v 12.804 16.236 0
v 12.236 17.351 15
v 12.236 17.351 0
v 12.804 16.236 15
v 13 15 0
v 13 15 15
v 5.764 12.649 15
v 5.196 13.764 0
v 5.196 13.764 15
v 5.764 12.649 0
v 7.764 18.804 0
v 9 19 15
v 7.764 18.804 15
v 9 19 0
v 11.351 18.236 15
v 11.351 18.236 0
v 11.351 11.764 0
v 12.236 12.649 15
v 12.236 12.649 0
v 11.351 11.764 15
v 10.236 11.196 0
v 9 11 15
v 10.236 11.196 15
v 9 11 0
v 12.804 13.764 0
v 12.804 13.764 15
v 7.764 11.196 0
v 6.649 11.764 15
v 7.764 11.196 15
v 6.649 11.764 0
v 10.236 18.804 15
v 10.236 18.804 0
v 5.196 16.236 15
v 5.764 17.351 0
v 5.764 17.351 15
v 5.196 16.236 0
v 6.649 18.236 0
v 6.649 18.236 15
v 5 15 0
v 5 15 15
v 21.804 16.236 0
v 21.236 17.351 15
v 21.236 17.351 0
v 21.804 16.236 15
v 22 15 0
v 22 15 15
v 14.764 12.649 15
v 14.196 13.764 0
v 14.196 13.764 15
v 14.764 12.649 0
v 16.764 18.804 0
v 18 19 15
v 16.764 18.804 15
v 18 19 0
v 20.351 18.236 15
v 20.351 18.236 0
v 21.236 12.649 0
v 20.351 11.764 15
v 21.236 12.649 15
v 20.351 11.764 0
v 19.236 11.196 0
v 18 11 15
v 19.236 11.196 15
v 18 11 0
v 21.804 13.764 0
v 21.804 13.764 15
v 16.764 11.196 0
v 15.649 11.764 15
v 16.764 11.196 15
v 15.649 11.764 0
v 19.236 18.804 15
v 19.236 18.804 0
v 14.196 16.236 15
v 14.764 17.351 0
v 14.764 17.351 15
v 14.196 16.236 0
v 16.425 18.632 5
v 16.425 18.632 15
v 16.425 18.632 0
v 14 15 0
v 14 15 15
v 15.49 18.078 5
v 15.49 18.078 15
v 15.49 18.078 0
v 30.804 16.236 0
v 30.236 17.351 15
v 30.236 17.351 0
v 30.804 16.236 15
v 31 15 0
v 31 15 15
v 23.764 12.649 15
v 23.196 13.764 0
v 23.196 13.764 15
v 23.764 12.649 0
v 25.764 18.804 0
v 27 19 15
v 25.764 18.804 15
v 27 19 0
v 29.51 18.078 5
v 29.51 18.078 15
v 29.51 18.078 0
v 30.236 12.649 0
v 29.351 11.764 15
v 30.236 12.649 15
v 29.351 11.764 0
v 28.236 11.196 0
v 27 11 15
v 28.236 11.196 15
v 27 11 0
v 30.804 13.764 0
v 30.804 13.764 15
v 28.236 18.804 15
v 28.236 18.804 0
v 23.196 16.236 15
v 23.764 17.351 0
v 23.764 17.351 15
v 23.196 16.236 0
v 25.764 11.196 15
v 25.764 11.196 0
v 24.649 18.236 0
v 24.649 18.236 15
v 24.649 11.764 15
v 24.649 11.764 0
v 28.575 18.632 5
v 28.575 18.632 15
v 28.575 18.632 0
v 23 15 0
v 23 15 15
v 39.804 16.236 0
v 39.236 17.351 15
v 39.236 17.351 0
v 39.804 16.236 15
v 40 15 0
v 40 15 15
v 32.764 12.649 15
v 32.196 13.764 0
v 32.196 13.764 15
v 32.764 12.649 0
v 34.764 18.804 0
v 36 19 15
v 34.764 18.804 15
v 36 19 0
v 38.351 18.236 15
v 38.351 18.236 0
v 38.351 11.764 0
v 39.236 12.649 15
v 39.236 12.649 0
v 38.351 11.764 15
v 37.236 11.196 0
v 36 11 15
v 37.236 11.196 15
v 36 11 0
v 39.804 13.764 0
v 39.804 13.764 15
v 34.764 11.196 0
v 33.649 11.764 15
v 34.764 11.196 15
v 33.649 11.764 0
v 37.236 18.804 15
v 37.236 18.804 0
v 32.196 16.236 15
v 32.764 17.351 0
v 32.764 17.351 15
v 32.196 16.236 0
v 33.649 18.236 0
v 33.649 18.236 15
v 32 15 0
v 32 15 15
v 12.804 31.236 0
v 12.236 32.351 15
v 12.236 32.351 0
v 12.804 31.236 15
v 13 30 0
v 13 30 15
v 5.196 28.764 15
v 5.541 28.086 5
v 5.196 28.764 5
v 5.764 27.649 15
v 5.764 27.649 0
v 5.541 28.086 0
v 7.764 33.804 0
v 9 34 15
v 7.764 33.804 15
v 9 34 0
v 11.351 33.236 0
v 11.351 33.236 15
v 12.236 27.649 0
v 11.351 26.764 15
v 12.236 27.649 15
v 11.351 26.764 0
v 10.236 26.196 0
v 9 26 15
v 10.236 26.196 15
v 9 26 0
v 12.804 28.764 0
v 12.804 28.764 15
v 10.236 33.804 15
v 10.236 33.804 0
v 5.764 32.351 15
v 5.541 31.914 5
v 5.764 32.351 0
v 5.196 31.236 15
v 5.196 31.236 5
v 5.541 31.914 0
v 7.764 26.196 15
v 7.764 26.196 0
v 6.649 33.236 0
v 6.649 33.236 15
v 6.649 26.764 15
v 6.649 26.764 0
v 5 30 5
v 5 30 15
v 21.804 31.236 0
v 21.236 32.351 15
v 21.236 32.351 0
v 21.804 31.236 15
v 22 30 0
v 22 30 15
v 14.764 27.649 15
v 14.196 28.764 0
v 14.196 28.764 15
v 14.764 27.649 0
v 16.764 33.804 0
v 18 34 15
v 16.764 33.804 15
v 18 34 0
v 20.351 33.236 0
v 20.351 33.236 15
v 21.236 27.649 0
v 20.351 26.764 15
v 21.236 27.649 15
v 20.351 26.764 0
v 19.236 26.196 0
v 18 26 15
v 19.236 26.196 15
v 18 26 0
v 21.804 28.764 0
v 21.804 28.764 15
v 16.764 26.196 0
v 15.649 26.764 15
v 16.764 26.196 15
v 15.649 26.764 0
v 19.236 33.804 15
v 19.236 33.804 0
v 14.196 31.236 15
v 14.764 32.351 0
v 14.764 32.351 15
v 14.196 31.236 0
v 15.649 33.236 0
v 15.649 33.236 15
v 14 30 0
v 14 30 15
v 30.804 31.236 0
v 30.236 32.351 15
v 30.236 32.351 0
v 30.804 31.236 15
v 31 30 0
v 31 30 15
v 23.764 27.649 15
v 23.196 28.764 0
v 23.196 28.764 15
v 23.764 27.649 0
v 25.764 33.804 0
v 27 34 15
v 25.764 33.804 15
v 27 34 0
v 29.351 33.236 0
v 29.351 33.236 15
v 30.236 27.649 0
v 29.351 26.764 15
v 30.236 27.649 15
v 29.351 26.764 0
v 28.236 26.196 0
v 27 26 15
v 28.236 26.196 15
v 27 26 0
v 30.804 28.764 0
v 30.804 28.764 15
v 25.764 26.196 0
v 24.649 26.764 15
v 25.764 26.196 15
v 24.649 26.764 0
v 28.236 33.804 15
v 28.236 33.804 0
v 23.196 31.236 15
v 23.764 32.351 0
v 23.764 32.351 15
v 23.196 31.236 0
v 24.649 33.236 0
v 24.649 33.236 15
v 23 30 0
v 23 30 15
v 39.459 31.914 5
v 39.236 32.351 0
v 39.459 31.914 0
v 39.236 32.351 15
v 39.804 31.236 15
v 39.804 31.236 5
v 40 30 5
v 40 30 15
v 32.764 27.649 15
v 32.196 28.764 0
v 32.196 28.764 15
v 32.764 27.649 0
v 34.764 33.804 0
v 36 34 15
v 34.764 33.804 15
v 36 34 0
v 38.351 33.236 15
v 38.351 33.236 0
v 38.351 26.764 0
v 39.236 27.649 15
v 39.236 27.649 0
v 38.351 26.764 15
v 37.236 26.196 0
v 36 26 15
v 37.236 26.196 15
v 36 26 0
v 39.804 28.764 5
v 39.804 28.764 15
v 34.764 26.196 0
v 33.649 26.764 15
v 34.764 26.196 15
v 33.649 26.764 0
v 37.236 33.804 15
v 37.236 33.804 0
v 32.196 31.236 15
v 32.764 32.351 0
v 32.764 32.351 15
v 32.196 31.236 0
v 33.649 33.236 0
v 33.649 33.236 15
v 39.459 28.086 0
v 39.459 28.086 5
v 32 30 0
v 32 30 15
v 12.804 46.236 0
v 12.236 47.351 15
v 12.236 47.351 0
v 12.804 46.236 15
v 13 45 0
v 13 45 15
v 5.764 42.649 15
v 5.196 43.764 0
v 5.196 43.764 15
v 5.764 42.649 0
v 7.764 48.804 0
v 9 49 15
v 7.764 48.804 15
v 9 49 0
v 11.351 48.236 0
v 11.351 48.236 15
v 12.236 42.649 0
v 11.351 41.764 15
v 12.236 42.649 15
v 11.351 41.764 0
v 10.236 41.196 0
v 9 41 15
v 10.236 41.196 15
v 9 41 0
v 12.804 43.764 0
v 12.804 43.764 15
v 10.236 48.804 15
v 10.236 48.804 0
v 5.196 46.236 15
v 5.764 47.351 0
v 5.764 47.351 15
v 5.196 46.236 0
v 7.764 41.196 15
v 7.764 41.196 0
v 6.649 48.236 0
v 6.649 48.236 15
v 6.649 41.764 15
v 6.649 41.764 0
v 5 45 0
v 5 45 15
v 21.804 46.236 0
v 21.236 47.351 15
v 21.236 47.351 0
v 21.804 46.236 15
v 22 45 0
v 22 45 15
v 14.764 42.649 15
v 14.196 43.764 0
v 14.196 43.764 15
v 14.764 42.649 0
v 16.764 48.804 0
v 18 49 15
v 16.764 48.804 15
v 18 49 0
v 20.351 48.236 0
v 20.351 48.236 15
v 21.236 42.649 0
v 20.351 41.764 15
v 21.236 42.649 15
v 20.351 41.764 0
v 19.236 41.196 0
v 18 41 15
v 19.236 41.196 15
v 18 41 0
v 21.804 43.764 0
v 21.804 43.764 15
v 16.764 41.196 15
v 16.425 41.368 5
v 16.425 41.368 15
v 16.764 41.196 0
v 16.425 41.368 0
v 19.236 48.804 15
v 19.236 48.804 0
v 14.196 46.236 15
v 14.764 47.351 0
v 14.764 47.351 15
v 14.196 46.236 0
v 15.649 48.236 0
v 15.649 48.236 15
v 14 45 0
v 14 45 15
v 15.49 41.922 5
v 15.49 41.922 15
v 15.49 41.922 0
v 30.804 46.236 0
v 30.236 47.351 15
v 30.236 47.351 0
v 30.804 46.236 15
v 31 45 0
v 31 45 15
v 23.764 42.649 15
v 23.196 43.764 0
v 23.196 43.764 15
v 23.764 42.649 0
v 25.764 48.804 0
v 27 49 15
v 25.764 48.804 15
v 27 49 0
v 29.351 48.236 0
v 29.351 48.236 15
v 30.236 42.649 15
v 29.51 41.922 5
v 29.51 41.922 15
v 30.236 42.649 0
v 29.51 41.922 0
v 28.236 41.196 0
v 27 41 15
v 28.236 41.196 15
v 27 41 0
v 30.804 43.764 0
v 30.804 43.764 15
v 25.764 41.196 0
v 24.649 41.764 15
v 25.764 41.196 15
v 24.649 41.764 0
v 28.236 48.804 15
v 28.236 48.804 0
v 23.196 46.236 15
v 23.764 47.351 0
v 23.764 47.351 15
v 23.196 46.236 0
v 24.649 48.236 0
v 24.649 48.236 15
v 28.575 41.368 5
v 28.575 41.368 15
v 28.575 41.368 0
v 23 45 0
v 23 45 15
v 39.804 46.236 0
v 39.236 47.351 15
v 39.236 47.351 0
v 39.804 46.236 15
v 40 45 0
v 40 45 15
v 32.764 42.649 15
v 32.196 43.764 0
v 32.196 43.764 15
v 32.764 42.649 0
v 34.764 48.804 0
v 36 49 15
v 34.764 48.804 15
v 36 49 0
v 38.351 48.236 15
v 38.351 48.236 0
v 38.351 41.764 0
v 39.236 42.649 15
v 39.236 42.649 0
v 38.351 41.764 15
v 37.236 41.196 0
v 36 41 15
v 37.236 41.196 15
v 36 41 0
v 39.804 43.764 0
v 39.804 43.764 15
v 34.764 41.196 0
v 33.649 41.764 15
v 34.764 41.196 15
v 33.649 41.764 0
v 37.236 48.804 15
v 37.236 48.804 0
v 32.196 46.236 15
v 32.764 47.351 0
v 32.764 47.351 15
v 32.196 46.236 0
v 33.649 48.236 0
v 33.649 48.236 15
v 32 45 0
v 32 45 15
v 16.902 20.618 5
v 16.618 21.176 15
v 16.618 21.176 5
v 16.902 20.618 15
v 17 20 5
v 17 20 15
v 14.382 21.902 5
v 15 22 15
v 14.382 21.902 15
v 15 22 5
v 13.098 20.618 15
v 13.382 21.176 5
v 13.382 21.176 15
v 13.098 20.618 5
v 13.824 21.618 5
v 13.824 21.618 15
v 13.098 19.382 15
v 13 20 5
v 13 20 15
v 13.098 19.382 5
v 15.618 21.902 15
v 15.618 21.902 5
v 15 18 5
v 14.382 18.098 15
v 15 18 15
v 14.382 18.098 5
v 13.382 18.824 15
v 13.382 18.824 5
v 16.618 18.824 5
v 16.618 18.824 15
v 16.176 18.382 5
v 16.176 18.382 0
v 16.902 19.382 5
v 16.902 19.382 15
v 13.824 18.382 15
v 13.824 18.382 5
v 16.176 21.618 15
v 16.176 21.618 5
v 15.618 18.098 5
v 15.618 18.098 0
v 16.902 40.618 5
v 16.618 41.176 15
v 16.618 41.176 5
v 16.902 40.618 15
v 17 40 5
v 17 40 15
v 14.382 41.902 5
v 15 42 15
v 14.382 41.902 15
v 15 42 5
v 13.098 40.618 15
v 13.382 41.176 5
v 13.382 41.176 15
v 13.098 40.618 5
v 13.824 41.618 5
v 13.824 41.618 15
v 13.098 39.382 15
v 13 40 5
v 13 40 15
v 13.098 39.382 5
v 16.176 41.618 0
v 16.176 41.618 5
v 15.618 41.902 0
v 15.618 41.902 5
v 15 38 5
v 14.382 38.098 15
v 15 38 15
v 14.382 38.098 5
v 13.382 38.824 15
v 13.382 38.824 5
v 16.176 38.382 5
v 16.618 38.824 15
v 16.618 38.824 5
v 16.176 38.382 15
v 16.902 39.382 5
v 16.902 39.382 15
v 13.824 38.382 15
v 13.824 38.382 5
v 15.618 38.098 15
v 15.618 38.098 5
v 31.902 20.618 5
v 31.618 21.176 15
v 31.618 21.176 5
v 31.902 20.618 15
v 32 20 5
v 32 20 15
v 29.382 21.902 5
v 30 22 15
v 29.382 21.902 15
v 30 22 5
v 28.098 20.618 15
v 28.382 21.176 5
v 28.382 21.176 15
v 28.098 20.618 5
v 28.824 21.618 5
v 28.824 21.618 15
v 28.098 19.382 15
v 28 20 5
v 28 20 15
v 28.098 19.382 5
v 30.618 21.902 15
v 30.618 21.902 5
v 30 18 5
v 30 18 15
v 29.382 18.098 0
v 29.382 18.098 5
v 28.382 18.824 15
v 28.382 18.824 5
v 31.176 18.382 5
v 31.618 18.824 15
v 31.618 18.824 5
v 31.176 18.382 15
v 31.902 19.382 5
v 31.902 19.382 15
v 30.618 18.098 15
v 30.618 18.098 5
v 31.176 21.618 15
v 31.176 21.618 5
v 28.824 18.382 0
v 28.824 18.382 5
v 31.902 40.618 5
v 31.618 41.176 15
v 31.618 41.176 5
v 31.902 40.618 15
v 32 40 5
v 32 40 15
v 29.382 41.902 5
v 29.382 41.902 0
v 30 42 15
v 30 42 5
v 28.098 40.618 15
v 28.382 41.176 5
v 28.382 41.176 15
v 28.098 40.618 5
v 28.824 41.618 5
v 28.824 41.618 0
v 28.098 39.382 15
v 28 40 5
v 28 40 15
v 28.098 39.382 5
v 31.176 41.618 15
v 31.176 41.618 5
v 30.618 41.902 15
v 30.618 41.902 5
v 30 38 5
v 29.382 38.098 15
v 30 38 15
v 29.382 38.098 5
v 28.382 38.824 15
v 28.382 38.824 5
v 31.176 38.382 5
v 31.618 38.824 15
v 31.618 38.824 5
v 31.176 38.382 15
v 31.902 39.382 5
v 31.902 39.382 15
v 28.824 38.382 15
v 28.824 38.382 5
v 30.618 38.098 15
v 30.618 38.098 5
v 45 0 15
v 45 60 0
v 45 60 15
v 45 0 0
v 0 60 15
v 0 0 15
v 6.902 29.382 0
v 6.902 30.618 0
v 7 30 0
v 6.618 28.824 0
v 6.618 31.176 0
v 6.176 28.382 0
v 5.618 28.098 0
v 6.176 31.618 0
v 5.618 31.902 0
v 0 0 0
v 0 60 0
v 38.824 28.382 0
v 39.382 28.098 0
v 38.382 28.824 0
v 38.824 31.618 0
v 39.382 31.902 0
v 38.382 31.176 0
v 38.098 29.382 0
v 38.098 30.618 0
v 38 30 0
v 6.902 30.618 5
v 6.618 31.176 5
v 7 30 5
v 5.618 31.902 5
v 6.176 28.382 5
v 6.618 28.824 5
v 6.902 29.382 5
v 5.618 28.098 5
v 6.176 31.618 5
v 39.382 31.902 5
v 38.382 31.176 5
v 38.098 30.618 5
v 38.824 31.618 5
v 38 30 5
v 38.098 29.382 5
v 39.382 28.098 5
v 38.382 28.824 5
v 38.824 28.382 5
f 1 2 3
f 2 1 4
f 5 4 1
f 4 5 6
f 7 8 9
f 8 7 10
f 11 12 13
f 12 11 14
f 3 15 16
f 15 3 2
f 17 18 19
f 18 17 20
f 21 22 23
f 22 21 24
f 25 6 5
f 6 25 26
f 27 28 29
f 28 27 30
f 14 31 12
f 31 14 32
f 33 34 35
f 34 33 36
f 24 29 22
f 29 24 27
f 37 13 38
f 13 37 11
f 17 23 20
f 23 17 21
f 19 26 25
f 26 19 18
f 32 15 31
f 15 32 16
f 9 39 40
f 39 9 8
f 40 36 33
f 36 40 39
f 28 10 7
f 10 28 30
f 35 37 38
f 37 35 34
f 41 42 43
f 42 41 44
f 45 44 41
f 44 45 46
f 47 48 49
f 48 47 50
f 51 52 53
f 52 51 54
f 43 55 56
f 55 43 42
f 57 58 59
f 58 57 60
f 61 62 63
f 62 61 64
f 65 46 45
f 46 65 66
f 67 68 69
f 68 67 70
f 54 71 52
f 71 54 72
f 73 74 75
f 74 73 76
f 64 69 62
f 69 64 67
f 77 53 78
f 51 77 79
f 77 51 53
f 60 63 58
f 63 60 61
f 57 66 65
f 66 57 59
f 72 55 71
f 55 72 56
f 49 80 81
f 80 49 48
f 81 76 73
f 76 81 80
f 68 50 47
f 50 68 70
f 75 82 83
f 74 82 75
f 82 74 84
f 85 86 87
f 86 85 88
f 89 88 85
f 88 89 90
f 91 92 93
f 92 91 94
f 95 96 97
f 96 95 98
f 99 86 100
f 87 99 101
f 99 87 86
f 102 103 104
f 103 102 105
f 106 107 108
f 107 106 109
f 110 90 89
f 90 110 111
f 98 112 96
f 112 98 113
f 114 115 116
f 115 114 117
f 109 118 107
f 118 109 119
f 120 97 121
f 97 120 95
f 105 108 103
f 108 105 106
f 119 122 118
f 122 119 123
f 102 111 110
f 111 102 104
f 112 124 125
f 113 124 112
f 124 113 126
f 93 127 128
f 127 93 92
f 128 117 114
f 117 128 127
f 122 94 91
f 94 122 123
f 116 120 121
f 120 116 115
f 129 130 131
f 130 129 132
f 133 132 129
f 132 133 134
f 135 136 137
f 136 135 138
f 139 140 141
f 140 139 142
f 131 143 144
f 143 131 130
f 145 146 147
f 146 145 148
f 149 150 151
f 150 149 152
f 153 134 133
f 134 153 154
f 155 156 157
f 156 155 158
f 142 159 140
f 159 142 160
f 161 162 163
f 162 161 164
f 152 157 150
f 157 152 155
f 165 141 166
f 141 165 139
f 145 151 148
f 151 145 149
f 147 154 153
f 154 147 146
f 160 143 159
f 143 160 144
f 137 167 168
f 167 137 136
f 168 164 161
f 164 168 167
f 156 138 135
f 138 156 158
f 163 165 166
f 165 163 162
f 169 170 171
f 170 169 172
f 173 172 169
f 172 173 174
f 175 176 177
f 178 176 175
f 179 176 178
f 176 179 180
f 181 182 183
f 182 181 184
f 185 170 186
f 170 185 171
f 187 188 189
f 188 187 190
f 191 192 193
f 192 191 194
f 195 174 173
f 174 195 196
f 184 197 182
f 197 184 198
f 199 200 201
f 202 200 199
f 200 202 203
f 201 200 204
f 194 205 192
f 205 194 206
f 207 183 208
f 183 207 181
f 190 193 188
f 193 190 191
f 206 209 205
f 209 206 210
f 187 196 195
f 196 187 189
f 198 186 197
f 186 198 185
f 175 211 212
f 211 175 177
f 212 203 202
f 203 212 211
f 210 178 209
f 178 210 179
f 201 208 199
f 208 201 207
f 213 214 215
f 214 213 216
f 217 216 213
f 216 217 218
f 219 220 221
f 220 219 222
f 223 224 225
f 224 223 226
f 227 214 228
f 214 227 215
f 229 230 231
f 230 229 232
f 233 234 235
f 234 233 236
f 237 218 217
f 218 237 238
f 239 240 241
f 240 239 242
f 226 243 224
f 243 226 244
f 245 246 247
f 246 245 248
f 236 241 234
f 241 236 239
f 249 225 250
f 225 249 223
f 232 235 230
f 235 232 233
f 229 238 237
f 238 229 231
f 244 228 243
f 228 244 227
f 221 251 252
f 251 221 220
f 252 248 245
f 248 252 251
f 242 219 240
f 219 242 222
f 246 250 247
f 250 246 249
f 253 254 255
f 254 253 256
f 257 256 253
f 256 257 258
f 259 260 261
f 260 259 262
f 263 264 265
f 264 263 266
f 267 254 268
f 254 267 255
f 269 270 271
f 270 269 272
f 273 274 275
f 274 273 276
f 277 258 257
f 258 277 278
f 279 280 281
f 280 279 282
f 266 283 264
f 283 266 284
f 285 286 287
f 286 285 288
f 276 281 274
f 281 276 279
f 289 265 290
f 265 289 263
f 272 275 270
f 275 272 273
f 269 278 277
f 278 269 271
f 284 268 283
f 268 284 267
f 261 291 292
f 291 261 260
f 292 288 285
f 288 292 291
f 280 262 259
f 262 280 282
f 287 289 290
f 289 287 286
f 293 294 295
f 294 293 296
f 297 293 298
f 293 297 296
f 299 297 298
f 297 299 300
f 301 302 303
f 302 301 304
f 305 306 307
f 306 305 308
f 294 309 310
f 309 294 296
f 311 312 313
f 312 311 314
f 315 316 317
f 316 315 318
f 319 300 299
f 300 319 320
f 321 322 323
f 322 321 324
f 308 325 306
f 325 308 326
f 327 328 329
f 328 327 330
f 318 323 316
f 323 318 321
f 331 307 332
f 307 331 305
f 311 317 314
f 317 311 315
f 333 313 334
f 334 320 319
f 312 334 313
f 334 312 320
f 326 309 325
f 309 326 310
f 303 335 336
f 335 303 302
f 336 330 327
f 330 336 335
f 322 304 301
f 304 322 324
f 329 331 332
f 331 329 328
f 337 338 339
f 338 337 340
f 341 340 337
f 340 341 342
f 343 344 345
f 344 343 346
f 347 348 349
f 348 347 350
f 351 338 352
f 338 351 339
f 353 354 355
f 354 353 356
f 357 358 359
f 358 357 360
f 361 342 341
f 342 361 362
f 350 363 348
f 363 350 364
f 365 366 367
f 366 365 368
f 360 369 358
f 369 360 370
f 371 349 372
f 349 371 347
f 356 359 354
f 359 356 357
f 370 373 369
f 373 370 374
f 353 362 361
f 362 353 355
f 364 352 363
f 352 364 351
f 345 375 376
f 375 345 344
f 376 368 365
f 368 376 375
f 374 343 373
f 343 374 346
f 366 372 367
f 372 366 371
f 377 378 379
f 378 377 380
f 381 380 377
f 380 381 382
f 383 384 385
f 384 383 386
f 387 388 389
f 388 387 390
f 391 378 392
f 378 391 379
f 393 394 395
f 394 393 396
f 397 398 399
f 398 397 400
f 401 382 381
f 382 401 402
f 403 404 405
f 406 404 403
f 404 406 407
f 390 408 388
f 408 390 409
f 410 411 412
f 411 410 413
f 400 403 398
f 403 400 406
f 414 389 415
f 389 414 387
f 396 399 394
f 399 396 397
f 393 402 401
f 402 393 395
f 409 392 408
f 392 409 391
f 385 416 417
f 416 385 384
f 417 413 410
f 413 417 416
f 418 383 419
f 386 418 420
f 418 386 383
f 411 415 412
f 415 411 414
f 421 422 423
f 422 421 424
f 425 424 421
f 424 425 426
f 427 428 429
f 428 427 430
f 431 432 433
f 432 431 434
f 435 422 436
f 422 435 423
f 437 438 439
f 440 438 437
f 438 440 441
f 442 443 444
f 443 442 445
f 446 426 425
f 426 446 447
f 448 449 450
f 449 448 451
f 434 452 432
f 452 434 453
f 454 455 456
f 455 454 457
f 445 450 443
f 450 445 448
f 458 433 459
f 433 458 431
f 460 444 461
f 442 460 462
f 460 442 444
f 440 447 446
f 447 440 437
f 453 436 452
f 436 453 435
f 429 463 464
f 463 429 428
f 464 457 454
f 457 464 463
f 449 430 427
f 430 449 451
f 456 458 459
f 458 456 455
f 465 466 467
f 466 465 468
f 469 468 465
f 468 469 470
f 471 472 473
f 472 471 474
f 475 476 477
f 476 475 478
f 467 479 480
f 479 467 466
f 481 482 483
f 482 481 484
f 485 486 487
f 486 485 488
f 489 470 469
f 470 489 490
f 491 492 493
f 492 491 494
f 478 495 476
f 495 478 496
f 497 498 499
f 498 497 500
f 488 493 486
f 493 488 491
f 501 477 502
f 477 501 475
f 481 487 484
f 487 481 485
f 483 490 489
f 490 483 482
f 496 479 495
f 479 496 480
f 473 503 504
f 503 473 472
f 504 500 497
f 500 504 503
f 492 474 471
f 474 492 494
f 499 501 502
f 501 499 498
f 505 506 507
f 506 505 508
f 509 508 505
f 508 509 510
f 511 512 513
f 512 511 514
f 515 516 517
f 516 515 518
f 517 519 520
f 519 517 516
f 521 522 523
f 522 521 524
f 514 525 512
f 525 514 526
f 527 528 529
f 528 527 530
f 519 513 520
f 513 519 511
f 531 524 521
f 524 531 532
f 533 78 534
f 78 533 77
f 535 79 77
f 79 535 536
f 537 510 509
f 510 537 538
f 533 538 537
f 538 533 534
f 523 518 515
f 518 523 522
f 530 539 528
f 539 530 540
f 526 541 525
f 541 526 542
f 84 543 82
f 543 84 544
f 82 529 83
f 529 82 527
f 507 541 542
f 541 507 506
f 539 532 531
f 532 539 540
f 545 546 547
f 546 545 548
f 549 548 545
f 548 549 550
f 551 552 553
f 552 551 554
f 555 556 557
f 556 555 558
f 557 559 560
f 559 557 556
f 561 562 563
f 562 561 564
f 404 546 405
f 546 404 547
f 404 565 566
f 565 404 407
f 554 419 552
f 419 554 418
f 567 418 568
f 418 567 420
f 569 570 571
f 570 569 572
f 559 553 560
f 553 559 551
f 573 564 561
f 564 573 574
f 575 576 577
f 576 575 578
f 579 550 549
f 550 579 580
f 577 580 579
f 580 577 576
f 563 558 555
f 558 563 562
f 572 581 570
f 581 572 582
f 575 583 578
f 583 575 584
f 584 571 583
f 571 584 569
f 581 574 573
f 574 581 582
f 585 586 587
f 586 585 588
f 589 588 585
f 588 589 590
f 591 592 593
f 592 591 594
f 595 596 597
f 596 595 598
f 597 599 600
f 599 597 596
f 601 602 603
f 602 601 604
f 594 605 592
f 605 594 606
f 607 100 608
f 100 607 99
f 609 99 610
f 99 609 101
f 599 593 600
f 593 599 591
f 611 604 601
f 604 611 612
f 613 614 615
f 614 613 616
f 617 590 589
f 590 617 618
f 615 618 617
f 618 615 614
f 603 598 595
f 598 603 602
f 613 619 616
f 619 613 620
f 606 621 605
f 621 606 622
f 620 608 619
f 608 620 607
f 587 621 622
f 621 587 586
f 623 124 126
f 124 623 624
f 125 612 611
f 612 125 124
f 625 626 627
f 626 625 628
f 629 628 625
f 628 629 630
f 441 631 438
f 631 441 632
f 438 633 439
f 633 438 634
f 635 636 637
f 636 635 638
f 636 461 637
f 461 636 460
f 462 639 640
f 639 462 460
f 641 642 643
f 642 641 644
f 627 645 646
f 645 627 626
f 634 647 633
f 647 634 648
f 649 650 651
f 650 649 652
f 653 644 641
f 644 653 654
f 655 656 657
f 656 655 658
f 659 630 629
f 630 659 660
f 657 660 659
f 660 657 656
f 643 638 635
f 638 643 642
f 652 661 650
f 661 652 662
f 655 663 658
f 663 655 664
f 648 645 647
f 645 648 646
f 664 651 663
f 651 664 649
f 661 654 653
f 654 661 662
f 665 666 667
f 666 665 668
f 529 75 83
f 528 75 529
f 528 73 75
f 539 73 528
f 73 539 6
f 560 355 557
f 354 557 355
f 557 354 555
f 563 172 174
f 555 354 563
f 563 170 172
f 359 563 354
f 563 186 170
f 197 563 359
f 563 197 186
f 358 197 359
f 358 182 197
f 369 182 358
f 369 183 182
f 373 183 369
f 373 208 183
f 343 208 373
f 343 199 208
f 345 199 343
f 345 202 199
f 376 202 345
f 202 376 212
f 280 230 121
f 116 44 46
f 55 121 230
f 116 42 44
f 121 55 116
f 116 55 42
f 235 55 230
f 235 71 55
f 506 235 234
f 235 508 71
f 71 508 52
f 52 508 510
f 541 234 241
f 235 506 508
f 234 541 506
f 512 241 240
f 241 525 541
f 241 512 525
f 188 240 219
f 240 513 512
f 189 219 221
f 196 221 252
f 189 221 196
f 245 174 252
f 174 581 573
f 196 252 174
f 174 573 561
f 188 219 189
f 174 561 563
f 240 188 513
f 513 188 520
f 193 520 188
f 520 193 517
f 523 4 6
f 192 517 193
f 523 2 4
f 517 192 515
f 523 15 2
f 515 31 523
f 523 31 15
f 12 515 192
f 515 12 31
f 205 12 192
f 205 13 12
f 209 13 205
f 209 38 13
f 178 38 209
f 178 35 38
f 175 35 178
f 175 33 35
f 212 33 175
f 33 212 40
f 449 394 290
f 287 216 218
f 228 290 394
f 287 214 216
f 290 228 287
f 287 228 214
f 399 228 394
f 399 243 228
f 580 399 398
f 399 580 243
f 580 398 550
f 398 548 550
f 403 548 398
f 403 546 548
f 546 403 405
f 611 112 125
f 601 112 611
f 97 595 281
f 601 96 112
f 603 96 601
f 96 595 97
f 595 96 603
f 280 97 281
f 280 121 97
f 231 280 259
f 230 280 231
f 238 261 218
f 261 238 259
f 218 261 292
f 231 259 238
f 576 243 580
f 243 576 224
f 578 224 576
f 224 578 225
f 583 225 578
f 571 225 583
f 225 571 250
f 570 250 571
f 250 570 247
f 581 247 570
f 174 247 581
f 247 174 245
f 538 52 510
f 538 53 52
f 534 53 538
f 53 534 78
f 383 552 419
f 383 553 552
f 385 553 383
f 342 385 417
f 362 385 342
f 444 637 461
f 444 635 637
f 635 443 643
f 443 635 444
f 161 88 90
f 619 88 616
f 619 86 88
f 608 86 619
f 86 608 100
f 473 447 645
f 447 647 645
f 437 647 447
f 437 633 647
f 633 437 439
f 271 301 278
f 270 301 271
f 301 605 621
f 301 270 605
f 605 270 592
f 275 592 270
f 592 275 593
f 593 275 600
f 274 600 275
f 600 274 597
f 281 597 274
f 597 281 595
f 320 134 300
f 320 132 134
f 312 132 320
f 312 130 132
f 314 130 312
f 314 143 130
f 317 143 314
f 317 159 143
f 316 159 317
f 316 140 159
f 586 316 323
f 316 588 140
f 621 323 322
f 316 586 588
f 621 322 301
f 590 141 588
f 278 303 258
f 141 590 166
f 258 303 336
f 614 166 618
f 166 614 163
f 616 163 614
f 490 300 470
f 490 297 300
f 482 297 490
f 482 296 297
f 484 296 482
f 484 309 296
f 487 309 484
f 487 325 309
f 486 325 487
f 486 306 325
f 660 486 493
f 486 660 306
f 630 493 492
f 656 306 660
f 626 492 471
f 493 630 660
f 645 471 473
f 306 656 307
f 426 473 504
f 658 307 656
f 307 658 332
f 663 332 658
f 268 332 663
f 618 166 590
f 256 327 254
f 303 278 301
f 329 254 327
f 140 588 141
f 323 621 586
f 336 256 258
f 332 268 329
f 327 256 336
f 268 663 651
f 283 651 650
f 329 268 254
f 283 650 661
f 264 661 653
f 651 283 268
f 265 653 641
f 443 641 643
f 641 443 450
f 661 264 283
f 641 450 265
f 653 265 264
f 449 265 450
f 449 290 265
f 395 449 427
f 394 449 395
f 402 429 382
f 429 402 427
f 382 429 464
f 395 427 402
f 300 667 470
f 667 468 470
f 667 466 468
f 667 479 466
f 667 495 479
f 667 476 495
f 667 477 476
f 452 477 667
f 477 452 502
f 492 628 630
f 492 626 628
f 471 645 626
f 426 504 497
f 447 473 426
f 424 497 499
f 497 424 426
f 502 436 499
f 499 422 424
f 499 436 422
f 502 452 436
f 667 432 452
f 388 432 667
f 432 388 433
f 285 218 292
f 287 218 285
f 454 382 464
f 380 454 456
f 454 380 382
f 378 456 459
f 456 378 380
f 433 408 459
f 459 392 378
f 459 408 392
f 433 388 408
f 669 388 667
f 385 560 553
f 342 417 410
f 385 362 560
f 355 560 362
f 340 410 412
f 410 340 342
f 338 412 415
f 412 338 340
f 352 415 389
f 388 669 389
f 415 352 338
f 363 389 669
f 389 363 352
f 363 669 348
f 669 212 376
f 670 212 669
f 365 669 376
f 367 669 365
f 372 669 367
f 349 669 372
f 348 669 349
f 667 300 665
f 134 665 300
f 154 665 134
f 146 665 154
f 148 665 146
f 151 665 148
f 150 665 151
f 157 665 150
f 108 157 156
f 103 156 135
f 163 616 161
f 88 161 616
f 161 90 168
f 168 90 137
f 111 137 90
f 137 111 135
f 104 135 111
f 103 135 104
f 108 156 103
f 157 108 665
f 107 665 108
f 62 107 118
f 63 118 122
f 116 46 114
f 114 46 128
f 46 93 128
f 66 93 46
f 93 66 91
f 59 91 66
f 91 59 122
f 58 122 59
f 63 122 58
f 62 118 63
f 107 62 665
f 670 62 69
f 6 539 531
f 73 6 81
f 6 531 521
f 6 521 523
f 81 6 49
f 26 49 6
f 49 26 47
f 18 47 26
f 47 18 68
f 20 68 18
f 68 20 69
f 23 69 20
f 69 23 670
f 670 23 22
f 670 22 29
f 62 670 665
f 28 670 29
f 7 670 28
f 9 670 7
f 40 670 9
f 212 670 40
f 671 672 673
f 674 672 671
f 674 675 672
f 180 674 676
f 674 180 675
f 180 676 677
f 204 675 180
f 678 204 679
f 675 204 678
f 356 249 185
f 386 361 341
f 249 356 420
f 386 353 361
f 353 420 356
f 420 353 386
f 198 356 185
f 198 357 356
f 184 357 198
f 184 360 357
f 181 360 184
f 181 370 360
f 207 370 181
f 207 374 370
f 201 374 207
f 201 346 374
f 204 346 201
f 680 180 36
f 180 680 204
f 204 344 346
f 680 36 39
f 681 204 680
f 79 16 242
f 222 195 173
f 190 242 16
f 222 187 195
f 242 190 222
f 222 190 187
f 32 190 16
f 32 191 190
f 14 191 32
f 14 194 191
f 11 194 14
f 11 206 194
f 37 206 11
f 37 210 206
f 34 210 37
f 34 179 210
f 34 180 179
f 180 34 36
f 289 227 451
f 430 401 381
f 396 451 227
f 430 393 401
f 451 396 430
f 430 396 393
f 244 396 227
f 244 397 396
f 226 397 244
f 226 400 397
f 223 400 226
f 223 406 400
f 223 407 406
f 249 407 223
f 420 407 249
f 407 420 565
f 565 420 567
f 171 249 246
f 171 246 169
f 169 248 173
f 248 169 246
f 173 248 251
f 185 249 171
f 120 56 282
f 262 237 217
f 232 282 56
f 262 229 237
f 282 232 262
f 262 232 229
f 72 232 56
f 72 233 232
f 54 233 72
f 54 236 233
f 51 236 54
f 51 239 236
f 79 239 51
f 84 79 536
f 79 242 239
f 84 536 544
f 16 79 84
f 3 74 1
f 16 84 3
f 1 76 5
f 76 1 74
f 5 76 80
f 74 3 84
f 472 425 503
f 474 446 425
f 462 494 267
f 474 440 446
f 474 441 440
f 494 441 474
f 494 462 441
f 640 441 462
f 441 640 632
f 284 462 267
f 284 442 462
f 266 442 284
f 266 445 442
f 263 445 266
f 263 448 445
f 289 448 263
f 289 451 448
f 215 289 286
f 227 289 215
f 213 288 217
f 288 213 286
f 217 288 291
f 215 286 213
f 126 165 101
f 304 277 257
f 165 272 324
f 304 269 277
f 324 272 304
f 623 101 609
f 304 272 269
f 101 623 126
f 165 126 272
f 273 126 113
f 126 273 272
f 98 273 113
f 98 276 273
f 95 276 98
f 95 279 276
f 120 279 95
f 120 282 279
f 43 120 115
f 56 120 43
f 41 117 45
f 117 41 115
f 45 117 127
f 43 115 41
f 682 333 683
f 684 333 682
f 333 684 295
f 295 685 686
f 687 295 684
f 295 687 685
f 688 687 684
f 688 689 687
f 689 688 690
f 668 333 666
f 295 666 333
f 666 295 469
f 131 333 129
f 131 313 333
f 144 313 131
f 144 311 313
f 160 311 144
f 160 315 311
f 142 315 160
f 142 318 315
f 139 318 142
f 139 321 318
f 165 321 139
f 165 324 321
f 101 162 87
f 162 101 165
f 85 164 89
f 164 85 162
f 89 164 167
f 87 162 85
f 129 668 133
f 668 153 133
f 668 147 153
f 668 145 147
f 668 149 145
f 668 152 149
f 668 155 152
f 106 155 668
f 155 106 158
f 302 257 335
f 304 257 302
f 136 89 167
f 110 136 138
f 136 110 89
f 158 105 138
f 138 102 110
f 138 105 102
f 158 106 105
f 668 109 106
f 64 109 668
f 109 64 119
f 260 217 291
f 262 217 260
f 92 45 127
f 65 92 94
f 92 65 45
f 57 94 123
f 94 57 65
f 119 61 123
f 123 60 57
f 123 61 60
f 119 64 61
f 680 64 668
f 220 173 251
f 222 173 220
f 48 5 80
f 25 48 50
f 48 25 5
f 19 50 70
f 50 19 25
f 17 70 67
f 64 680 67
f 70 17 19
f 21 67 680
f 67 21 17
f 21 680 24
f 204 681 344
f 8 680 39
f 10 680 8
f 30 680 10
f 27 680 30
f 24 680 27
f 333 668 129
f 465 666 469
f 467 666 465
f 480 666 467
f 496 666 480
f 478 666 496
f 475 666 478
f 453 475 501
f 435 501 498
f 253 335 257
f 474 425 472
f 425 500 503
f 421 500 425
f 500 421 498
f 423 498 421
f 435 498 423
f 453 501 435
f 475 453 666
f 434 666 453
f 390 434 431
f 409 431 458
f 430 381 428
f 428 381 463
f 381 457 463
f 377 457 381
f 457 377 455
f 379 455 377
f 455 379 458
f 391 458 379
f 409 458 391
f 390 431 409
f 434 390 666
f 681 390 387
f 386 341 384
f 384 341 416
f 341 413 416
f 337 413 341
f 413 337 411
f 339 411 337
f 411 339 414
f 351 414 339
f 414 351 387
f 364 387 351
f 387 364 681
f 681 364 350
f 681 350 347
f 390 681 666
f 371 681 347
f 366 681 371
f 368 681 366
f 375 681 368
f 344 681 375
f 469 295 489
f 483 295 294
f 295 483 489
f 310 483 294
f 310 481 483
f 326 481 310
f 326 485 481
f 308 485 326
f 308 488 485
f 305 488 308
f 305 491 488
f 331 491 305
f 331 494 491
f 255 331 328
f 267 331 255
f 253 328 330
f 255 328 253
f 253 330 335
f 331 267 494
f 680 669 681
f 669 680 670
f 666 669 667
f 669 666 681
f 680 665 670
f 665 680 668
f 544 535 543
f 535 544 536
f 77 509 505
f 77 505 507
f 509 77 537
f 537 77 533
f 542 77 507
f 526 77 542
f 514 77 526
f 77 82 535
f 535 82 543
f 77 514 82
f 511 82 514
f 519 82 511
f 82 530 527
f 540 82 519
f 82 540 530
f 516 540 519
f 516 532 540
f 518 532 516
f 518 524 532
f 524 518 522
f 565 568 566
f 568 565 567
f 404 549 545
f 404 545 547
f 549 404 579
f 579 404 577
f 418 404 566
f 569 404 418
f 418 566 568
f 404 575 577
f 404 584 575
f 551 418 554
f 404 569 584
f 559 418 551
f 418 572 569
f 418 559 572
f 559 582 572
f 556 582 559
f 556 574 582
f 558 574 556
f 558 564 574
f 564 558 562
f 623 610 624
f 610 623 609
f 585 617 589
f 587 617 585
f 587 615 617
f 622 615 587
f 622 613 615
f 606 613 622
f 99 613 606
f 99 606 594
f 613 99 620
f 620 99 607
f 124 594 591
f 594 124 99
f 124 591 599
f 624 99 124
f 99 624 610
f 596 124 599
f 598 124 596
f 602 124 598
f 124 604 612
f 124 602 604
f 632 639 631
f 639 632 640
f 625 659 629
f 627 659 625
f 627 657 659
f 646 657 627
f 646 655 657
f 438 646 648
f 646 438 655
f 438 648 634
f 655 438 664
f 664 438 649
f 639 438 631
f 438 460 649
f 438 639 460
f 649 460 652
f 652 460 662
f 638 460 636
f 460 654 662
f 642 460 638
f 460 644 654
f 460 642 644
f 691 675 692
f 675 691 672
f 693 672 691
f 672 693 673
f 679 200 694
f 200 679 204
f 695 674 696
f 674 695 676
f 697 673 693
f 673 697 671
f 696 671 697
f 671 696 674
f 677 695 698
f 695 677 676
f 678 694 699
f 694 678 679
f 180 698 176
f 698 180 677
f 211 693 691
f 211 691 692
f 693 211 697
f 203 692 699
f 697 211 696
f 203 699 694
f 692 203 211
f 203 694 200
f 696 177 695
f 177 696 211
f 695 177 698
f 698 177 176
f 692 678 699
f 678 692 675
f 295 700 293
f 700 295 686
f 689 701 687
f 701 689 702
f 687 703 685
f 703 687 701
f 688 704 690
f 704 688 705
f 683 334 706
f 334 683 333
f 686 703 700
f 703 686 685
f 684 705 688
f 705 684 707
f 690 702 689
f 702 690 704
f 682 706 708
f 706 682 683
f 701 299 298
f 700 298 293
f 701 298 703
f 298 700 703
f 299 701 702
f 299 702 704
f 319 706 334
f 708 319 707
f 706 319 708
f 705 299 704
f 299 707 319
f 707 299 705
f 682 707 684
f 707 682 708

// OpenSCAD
/* 
 * Socket Tree Generator
 * Holds sockets in organized tree structure
 * Compatible with toolgrid-generator.scad peg hole pattern
 */

/* [Display Mode] */
print_mode = "single"; // [single, multi_row]

/* [Grid Integration] */
hole_center_spacing = 9.5; // [8:12]
pin_hole_diameter = 4.2; // [3:8]

/* [Drive Size] */
drive_size = "1-2"; // [1-2, 1-4, 3-8]

/* [Tree Dimensions] */
tree_width = 45; // [30:60]
tree_height = 60; // [40:80]
tree_depth = 15; // [10:30]

/* [Socket Configuration] */
socket_diameter = 8; // [5:15] - Socket hole diameter
num_socket_rows = 3; // [1:5] - Number of rows
sockets_per_row = 4; // [2:8] - Sockets per row

/* [Pin Configuration] */
pin_diameter = 4.0; // [3:6]
num_pins_x = 2; // [1:4]
num_pins_y = 2; // [1:4]

/* [Rotation] */
holder_rotation = 0; // [0:360]

/* [Wall Thickness] */
wall_thickness = 3; // [2:5]
floor_thickness = 2; // [1:4]

/* [Advanced] */
pin_offset_from_edge = 3; // [1:8]

// ===== CALCULATED PARAMETERS =====
pin_spacing_x = tree_width / (num_pins_x + 1);
pin_spacing_y = tree_height / (num_pins_y + 1);
socket_spacing_x = tree_width / (sockets_per_row + 1);
socket_spacing_y = tree_height / (num_socket_rows + 1);

// ===== MAIN MODULES =====

module socket_hole(x, y) {
    translate([x, y, -1]) {
        cylinder(d=socket_diameter, h=tree_depth + 2, $fn=20);
    }
}

module tree_base() {
    difference() {
        cube([tree_width, tree_height, tree_depth]);
        
        // Create socket holes in grid pattern
        for (row = [1:num_socket_rows]) {
            for (col = [1:sockets_per_row]) {
                socket_hole(
                    col * socket_spacing_x,
                    row * socket_spacing_y
                );
            }
        }
        
        // Support pins cutouts
        for (x = [1:num_pins_x]) {
            for (y = [1:num_pins_y]) {
                pin_x = x * pin_spacing_x;
                pin_y = y * pin_spacing_y;
                translate([pin_x, pin_y, pin_offset_from_edge]) {
                    cylinder(d=pin_diameter, h=tree_depth, $fn=20);
                }
            }
        }
    }
    
    // Support pins
    for (x = [1:num_pins_x]) {
        for (y = [1:num_pins_y]) {
            pin_x = x * pin_spacing_x;
            pin_y = y * pin_spacing_y;
            translate([pin_x, pin_y, 0]) {
                cylinder(d=pin_diameter, h=pin_offset_from_edge + pin_diameter/2, $fn=20);
            }
        }
    }
}

module mounting_pegs() {
    peg_diameter = pin_hole_diameter - 0.2;
    peg_height = 5;
    
    translate([pin_diameter/2 + wall_thickness, tree_height/2, 0]) {
        cylinder(d=peg_diameter, h=peg_height, $fn=20);
    }
    translate([tree_width - wall_thickness - pin_diameter/2, tree_height/2, 0]) {
        cylinder(d=peg_diameter, h=peg_height, $fn=20);
    }
}

module complete_tree() {
    translate([tree_width/2, tree_height/2, 0]) {
        rotate([0, 0, holder_rotation]) {
            translate([-tree_width/2, -tree_height/2, 0]) {
                tree_base();
            }
        }
    }
    mounting_pegs();
}

// ===== GENERATION =====

if (print_mode == "single") {
    complete_tree();
} else if (print_mode == "multi_row") {
    spacing = hole_center_spacing * 3;
    for (i = [0:2]) {
        translate([i * spacing, 0, 0]) {
            complete_tree();
        }
    }
}

// ===== DEBUG OUTPUT =====
echo("=== Socket Tree Generator ===");
echo("Drive size: ", drive_size);
echo("Tree dimensions: ", tree_width, "×", tree_height, "×", tree_depth, "mm");
echo("Sockets: ", num_socket_rows, " rows × ", sockets_per_row, " per row");
echo("Socket diameter: ", socket_diameter, "mm");
echo("Support pins: ", num_pins_x, "×", num_pins_y);
echo("Rotation: ", holder_rotation, "°");
